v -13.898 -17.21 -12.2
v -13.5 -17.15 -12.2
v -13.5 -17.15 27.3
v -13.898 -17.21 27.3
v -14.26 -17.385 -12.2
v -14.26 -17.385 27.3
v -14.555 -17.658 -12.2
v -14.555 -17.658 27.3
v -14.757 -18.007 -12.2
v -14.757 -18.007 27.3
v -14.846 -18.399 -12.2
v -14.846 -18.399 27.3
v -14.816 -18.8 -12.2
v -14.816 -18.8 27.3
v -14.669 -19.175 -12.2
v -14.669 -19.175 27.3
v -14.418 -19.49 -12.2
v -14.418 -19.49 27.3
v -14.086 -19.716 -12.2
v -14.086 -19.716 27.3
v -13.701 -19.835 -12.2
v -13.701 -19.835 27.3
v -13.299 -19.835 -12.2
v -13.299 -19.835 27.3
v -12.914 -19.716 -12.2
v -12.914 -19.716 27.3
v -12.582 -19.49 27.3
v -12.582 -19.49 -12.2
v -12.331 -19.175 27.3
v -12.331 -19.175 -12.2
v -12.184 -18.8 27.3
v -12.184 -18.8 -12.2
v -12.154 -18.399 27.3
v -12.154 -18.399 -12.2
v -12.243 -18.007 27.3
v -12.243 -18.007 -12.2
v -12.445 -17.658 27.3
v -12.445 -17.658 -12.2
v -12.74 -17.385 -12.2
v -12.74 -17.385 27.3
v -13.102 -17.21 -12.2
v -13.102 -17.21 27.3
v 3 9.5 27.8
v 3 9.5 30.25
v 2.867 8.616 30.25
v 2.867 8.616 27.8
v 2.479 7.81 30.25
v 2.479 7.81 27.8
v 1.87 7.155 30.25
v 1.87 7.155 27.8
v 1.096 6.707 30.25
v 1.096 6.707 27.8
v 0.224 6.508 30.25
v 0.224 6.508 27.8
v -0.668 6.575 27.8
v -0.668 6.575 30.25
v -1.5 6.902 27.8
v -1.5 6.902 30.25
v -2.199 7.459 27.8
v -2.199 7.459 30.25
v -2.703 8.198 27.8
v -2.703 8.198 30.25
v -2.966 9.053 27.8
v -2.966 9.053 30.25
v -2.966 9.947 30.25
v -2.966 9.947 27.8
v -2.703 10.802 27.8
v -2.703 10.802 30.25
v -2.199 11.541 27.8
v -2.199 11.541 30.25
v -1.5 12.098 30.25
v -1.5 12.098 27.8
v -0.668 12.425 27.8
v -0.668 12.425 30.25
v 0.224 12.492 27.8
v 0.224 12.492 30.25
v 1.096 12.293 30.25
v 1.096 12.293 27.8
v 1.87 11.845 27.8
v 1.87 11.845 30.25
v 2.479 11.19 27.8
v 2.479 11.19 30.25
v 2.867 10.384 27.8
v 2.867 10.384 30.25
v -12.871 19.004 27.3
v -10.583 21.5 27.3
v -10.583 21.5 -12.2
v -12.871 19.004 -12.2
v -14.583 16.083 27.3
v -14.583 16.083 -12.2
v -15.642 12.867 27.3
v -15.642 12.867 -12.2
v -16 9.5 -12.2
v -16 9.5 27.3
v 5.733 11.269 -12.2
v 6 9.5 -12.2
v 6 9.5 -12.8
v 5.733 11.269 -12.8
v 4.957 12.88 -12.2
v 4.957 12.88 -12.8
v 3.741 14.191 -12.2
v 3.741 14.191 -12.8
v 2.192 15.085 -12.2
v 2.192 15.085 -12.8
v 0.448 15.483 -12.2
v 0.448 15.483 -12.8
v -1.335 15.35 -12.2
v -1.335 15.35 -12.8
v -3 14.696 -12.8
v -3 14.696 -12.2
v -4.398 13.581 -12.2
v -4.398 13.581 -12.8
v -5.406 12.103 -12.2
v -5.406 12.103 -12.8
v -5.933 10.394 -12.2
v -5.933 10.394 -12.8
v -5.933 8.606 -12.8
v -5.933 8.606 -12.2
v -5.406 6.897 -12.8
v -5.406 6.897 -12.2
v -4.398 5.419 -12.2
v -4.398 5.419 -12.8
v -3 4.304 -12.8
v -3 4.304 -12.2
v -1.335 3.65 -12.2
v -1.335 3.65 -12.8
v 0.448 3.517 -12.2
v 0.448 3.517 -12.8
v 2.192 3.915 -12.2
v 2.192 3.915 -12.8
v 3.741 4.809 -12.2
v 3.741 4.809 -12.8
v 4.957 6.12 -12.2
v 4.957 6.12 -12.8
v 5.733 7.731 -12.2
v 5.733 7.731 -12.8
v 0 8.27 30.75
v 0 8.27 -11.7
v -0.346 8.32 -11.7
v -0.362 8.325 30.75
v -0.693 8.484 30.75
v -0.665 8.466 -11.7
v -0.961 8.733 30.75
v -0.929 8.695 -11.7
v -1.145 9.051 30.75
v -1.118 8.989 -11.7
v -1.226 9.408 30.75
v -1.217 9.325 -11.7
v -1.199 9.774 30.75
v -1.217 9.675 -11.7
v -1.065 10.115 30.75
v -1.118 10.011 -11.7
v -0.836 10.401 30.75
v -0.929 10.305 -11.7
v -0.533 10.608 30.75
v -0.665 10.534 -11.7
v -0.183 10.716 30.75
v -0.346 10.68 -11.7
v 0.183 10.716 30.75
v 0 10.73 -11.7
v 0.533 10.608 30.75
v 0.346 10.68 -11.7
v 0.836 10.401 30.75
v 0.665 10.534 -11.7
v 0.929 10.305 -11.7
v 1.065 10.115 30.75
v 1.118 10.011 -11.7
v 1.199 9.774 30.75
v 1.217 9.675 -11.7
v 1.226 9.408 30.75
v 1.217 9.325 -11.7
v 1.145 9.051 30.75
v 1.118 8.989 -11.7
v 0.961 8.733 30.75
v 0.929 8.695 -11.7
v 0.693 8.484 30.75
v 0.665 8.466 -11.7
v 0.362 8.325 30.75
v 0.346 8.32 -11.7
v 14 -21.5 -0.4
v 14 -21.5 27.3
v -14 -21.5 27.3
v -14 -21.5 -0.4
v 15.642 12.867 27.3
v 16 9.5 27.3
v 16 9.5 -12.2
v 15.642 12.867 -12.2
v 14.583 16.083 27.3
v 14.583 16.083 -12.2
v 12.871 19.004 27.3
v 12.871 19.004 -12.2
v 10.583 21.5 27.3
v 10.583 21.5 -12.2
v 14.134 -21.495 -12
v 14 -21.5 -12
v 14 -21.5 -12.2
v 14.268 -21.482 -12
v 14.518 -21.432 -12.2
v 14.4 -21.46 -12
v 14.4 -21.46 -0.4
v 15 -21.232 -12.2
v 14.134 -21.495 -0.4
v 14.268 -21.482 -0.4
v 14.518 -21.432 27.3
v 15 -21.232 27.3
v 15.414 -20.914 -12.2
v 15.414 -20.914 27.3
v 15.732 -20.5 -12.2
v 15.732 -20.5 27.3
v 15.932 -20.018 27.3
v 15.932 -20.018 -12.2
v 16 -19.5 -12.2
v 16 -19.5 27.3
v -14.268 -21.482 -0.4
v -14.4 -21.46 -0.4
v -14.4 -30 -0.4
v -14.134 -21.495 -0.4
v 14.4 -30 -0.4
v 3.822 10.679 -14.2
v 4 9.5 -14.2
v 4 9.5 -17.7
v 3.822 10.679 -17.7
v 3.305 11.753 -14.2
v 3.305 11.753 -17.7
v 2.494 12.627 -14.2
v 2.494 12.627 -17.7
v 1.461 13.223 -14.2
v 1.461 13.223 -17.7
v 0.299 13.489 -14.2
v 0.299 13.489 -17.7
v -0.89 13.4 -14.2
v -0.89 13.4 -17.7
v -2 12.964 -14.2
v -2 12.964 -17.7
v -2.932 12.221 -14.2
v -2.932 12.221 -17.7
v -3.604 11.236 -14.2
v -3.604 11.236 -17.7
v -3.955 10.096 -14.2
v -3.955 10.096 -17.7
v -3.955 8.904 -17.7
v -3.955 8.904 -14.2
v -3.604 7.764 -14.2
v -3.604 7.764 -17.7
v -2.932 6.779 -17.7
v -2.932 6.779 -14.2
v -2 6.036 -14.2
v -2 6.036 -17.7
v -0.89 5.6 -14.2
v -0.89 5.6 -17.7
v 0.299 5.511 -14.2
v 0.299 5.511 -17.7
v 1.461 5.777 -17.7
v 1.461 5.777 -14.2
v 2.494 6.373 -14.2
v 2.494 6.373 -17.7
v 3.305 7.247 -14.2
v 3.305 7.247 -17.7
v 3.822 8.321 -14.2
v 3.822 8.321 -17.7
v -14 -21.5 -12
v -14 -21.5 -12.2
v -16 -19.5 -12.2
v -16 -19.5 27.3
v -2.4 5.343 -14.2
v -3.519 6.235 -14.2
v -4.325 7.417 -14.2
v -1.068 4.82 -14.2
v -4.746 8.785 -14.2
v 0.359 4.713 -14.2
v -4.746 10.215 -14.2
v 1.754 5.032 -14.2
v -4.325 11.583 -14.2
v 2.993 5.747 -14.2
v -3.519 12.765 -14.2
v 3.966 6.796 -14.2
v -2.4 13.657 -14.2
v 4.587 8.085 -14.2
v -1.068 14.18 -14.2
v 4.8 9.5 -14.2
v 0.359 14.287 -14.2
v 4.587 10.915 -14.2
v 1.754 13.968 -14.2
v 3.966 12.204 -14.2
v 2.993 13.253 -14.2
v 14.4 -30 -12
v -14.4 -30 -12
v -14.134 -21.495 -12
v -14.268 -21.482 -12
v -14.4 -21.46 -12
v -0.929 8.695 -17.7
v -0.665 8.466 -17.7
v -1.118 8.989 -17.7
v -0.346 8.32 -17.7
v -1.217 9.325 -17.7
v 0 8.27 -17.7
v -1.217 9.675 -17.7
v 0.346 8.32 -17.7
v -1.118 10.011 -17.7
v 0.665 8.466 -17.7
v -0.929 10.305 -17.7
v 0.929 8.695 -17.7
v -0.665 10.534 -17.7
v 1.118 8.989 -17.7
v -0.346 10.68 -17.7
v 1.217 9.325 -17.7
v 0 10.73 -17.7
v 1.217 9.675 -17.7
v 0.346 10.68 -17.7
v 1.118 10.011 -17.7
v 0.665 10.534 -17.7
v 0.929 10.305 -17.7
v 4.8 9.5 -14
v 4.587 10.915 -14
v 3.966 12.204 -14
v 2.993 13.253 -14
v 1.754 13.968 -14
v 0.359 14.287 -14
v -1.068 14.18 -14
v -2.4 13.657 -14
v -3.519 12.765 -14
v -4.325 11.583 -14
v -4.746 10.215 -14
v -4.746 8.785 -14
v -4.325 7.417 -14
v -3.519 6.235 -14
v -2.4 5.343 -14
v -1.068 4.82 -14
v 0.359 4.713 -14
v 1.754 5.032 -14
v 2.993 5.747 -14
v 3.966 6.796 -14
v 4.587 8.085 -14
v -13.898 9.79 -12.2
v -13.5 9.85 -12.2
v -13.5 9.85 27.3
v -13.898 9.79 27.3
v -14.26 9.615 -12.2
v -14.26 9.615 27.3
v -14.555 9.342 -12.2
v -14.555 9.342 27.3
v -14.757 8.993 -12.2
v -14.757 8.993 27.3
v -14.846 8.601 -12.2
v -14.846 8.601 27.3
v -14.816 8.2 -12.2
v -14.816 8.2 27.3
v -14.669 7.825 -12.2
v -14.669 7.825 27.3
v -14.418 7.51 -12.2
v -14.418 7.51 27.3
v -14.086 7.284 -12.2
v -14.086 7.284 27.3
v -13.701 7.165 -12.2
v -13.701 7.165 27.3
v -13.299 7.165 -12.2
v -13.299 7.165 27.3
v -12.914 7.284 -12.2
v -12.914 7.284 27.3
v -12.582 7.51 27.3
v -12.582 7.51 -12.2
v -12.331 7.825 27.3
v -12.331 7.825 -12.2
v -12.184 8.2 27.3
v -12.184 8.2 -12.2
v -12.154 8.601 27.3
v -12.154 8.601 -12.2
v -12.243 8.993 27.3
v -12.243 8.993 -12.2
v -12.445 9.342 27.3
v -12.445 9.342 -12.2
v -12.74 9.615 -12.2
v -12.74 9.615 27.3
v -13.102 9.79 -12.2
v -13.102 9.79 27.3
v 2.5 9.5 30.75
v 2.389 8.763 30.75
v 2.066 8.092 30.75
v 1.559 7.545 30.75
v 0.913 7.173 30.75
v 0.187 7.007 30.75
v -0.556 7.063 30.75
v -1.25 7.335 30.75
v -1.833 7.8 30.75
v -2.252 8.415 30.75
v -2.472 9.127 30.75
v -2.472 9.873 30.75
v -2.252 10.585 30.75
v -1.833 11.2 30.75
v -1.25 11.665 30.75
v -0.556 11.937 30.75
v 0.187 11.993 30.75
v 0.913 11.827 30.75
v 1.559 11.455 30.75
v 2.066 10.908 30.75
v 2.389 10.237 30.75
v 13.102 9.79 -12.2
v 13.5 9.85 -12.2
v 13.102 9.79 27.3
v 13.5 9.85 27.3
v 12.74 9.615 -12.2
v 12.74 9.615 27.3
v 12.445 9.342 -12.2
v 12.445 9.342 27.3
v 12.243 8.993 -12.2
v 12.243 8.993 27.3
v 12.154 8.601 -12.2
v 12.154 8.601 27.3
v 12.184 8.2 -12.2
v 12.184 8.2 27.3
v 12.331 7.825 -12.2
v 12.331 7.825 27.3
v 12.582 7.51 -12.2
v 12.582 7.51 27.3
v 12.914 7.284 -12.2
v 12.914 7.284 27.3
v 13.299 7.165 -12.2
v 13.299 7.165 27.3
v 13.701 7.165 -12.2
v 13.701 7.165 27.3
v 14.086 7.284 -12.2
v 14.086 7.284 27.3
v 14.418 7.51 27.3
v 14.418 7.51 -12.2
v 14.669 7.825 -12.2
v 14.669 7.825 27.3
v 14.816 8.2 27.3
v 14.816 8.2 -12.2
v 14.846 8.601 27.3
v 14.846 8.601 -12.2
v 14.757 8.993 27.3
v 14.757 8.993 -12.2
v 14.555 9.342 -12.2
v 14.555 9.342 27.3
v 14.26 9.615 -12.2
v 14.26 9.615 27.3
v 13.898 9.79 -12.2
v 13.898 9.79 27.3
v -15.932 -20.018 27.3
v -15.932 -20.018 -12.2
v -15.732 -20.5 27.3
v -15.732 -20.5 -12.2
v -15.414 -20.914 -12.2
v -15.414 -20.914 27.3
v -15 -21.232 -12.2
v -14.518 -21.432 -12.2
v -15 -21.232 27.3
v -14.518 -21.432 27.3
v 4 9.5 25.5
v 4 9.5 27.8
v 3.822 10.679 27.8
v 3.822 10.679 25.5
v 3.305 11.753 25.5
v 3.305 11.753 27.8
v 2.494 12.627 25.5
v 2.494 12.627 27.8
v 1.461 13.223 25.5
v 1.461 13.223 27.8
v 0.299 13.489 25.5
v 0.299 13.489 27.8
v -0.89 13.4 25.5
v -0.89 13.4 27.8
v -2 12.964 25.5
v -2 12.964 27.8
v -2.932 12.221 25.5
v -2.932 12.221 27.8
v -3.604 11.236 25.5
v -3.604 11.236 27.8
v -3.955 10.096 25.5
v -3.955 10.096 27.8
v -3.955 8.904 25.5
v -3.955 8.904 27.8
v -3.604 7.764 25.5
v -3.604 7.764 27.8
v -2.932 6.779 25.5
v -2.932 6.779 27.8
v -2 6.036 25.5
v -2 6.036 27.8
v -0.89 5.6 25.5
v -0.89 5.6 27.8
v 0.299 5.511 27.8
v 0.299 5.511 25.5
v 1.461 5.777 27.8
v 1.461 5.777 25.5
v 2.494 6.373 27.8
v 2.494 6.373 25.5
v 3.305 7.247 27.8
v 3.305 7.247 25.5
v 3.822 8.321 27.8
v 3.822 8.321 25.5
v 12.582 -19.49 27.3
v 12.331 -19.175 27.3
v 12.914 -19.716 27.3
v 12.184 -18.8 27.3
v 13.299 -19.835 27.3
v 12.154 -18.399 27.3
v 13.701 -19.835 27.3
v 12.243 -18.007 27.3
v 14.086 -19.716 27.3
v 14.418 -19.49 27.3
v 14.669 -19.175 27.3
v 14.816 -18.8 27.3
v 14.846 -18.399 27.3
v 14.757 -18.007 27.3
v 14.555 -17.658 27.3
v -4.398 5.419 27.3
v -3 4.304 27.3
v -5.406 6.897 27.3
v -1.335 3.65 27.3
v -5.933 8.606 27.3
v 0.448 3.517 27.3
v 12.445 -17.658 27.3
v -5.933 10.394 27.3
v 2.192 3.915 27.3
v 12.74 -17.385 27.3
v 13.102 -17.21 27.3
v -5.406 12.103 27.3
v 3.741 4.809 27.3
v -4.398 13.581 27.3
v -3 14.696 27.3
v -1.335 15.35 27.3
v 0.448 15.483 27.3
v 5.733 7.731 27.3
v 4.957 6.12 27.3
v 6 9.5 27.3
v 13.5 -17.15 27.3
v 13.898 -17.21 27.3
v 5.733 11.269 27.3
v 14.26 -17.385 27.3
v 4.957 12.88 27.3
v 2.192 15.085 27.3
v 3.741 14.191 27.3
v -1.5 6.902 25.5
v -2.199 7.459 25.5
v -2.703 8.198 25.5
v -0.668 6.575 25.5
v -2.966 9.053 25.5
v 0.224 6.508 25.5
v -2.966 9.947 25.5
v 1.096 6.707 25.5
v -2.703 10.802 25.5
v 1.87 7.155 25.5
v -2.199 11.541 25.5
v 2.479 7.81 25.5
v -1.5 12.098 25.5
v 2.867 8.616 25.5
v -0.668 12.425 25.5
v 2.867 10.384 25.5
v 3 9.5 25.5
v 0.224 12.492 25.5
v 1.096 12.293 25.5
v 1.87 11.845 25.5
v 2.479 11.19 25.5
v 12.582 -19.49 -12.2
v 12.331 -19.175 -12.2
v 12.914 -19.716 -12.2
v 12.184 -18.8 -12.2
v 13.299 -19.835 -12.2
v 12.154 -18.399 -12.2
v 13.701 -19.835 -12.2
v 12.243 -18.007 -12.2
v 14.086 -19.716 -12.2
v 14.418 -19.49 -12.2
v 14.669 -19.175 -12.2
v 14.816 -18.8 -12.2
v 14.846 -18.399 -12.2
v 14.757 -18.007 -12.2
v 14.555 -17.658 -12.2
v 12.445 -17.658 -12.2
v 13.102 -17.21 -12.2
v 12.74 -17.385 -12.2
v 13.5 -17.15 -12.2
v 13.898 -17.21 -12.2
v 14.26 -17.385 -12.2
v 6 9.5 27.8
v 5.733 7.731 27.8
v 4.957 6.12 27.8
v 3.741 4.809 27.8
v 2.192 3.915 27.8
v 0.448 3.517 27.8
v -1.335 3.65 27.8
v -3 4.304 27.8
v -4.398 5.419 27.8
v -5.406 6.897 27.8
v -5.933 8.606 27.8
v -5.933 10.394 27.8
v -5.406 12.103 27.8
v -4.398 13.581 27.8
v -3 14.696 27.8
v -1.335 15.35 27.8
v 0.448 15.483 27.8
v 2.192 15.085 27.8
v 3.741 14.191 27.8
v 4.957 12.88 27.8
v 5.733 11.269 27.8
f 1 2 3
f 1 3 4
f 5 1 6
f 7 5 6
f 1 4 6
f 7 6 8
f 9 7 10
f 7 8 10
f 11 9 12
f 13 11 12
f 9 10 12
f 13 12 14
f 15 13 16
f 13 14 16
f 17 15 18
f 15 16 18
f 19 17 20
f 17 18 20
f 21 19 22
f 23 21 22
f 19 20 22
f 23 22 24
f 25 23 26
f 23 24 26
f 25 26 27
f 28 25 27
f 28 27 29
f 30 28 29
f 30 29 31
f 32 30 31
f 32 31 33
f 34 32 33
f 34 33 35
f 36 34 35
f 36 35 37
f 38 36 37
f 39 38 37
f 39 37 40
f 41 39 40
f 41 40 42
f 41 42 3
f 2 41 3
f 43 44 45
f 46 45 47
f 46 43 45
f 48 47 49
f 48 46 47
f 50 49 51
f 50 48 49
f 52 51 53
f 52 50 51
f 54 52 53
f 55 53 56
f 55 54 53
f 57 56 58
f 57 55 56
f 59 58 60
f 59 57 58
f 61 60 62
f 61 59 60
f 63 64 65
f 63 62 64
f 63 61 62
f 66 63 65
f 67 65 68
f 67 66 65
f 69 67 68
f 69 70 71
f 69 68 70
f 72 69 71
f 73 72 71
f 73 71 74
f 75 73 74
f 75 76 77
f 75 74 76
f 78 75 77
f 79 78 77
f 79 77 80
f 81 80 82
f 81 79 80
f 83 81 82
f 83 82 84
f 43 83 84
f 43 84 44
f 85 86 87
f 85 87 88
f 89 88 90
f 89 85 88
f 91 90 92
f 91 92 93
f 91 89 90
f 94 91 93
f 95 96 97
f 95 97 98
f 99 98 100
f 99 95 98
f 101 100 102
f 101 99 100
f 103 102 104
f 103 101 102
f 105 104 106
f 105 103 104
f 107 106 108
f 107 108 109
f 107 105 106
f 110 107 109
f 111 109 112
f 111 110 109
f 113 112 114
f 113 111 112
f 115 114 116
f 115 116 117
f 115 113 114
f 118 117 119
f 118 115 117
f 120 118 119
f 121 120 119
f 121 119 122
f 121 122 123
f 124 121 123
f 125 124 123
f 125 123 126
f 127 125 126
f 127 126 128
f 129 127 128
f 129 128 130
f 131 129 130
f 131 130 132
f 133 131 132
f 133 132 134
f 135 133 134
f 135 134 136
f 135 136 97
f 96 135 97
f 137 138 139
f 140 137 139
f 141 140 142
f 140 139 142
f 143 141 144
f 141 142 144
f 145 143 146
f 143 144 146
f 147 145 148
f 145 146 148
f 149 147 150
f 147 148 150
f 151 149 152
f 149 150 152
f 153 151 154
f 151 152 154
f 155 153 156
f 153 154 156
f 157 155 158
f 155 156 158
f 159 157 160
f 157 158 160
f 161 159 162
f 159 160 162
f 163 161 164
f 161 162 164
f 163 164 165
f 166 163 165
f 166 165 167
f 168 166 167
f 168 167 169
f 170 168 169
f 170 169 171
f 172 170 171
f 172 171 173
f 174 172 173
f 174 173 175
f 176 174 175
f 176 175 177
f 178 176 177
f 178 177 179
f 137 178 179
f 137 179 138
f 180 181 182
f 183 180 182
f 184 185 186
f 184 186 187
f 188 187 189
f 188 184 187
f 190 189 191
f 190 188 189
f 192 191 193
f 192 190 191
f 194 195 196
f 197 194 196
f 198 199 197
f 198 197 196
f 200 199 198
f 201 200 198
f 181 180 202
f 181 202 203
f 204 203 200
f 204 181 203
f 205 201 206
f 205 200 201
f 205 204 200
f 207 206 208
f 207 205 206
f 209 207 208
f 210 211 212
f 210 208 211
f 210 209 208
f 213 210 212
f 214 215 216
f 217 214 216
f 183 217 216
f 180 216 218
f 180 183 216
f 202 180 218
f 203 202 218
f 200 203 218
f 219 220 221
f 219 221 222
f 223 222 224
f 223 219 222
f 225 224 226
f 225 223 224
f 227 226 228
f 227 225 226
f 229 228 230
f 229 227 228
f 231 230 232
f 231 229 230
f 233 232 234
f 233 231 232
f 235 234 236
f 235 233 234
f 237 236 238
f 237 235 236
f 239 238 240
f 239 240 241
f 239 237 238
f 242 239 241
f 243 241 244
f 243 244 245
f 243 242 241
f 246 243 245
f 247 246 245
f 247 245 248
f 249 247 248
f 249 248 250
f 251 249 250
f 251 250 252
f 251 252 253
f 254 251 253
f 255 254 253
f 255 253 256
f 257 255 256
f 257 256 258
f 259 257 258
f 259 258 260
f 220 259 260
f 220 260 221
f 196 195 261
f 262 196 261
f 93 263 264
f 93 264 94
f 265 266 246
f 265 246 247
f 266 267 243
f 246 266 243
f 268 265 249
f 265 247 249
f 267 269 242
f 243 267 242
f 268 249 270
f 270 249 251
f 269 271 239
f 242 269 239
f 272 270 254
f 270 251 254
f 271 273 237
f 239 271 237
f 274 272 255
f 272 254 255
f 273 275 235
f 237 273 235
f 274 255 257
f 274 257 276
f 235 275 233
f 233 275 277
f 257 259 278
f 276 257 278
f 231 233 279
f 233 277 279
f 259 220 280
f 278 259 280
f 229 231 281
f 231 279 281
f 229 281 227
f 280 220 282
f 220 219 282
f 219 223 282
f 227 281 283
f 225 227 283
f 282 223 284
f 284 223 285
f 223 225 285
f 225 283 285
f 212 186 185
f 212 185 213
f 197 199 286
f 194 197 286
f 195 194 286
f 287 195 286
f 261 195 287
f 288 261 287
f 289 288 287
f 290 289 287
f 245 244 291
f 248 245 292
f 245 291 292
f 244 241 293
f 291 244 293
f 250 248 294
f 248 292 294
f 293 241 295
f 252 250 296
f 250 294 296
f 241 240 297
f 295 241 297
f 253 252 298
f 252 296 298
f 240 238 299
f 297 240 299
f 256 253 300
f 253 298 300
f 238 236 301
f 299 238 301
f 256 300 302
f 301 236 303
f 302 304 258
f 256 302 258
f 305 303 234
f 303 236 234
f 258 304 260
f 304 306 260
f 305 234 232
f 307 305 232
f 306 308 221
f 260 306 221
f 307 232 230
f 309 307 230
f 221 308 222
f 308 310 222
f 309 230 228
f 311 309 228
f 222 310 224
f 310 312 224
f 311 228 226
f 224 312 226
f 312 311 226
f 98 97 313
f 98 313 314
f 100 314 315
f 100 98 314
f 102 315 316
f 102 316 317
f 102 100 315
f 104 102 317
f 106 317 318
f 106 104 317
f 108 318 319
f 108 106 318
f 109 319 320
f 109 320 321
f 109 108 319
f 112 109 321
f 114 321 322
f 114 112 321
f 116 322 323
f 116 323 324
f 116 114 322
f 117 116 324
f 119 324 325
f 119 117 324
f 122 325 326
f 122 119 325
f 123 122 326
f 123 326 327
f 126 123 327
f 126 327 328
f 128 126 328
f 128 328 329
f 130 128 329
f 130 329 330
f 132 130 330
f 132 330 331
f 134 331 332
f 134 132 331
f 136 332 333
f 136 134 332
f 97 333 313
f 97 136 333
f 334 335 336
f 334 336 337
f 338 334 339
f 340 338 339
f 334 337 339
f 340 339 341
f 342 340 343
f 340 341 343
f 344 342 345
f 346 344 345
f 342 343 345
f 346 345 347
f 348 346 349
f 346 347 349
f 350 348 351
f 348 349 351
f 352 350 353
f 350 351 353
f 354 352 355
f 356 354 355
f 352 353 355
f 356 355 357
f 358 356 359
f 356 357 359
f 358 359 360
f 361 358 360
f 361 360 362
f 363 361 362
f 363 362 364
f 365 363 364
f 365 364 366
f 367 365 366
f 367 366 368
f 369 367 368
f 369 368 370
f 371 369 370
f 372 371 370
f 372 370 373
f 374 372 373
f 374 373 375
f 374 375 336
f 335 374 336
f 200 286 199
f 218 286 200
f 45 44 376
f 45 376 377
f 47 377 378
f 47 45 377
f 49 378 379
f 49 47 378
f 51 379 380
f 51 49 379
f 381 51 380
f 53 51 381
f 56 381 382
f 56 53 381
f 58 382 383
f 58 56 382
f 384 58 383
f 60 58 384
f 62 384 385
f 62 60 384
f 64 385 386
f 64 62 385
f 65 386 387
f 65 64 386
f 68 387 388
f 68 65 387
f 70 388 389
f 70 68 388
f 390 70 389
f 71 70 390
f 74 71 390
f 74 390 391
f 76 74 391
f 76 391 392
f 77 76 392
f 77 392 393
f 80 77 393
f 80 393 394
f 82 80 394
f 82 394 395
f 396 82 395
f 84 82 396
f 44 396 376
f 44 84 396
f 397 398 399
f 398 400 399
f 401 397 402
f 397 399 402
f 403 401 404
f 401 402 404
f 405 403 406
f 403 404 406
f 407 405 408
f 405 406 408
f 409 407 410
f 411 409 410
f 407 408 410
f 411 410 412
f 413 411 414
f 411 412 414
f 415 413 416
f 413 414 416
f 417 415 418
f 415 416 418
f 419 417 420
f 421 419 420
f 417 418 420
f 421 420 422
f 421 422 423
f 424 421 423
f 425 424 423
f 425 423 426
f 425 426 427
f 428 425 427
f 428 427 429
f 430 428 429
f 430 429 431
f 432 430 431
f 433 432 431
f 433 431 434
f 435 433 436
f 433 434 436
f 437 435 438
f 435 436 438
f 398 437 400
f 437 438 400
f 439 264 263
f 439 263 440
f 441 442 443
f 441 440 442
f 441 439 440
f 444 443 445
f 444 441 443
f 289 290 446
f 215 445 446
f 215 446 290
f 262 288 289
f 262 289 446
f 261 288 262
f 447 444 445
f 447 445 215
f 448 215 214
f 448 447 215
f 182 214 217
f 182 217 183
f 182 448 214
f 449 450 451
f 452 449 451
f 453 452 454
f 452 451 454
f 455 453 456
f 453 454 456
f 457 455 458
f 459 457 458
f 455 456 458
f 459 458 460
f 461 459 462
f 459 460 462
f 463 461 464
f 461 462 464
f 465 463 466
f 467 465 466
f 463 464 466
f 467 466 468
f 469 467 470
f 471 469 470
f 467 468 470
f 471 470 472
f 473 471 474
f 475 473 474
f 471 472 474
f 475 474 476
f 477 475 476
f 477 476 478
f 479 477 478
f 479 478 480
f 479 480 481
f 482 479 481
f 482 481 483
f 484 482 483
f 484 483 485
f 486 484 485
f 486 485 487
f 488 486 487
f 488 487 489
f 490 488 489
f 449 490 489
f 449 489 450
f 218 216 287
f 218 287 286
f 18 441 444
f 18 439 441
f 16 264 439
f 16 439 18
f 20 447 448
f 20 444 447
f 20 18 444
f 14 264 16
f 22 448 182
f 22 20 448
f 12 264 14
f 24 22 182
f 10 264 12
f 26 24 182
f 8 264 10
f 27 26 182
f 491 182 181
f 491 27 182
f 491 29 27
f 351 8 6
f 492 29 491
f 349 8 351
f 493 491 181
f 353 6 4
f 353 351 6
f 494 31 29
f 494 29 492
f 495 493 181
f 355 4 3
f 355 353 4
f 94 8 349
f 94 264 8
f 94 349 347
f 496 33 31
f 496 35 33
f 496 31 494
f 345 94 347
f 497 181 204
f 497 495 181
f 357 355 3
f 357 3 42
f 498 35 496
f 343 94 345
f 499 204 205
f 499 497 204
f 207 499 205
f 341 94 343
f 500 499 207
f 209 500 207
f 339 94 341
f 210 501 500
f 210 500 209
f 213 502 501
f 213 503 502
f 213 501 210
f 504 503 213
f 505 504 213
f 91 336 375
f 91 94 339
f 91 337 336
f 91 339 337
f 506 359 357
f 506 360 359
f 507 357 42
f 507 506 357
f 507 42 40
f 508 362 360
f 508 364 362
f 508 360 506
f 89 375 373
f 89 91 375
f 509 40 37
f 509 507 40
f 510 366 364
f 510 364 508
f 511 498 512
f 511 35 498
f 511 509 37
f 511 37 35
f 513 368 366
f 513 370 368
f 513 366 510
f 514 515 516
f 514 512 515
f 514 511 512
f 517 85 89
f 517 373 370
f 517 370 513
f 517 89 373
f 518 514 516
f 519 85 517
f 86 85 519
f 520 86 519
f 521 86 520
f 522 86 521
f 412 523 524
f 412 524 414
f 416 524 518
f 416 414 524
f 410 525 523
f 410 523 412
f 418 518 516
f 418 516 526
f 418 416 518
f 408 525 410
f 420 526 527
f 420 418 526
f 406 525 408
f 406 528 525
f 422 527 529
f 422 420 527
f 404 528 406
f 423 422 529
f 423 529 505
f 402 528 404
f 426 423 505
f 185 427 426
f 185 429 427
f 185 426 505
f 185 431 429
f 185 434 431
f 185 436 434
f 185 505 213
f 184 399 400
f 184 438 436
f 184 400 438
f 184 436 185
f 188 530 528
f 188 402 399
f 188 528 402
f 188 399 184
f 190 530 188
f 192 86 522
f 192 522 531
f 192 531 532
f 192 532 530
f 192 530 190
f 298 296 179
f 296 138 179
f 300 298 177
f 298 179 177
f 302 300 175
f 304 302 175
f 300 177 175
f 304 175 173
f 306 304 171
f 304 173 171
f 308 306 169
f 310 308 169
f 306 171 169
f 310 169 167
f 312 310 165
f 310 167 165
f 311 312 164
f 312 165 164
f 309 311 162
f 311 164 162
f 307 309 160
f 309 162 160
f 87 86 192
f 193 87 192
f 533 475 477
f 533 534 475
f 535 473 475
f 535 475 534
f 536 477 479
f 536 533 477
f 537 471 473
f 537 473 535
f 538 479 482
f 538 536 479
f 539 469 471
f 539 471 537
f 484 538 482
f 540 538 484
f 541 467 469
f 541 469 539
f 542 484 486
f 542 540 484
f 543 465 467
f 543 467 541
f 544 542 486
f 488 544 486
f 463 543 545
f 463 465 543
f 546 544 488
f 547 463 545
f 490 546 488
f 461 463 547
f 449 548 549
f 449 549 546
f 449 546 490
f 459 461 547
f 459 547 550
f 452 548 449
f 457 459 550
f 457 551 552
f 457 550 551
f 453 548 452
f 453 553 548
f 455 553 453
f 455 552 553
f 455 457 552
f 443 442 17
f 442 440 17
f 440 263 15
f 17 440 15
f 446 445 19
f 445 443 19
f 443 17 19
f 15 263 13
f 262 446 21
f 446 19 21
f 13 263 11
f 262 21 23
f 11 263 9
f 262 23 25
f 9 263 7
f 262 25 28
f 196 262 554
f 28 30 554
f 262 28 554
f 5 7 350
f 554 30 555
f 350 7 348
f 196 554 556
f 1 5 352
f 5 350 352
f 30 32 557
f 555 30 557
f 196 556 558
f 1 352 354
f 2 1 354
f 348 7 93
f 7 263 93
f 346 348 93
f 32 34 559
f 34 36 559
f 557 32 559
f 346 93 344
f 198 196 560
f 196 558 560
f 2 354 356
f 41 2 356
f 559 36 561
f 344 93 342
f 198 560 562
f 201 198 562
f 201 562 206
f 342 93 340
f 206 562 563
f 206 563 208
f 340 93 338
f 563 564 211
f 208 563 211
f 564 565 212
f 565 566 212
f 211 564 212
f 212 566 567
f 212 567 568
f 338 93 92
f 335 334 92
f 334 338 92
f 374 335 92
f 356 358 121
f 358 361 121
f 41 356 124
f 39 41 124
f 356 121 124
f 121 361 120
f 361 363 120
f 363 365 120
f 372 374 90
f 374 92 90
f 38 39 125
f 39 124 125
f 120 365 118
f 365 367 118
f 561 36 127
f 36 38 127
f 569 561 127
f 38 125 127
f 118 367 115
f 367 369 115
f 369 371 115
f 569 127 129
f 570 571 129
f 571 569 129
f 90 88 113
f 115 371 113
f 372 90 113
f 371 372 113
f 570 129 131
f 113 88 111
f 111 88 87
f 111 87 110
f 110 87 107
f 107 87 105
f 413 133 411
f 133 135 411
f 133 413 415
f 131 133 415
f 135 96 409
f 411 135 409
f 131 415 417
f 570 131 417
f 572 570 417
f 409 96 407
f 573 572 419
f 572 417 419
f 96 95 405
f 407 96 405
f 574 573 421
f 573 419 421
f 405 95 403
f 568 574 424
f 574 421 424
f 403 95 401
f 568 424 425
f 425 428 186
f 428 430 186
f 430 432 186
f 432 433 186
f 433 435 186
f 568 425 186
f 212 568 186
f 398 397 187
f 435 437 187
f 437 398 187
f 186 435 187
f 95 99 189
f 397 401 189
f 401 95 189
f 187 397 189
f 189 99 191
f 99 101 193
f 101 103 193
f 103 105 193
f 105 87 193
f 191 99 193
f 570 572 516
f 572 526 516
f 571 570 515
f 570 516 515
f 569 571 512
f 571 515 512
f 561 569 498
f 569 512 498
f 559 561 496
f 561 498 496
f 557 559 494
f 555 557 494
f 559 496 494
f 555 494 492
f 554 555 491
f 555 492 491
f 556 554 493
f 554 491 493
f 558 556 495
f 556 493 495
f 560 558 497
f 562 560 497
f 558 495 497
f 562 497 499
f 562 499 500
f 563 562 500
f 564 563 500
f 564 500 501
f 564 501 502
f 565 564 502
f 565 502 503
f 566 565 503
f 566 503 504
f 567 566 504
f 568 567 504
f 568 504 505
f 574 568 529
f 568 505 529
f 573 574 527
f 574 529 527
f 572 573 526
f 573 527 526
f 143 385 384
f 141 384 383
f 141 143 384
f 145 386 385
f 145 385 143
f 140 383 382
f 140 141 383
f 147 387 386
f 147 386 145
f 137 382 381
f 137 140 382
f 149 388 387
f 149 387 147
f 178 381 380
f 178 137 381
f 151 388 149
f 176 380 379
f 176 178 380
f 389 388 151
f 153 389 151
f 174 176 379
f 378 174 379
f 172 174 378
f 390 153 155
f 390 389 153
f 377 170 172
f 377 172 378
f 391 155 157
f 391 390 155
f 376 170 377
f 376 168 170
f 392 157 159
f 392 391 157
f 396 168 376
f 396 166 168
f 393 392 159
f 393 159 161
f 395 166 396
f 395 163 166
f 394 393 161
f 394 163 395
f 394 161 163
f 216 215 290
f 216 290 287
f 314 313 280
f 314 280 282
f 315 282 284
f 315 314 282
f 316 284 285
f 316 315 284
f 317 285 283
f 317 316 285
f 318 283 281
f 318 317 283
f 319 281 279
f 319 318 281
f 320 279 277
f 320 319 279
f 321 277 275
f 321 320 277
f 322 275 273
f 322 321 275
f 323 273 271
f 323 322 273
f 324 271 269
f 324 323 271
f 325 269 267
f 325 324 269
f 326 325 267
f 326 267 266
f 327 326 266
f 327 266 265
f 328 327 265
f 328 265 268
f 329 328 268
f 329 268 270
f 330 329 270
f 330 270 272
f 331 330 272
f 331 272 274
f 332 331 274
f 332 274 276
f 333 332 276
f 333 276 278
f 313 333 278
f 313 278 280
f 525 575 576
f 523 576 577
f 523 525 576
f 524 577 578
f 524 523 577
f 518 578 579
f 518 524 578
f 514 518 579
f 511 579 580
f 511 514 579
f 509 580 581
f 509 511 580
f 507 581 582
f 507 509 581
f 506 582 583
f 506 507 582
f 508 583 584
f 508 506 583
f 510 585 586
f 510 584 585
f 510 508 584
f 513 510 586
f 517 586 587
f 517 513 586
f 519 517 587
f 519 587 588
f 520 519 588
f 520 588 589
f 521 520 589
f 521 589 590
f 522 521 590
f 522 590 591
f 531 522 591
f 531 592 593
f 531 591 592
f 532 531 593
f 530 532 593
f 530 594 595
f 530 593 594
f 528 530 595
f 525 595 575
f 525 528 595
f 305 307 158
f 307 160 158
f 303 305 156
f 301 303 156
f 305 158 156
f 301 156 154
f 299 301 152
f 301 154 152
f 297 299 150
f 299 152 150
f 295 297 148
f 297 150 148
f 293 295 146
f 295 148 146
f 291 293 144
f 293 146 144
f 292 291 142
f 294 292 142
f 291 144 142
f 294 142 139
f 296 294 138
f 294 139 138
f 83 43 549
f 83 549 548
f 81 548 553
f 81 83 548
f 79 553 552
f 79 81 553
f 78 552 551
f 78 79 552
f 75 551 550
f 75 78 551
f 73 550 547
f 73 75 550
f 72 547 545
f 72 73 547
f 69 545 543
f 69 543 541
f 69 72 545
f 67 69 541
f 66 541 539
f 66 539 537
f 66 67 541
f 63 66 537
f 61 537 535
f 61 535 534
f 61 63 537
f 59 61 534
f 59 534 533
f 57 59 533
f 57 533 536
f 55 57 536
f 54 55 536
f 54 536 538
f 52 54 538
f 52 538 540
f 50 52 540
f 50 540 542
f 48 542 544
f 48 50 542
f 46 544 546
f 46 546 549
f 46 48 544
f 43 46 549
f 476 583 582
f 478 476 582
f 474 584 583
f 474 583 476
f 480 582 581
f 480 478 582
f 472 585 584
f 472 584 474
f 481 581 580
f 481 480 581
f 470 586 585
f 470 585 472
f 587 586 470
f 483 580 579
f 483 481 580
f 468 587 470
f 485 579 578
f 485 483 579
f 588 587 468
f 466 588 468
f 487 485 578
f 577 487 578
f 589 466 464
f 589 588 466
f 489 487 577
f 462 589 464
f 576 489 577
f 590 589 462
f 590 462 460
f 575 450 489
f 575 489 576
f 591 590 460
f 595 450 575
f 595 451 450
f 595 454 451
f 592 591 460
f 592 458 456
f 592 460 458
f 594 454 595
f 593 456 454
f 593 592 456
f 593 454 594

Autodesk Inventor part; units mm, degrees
ref_plane "YZ Plane" through (0, 0, 0) normal (1, 0, 0) x (0, 1, 0)
ref_plane "XZ Plane" through (0, 0, 0) normal (0, 1, 0) x (-1, 0, 0)
ref_plane "XY Plane" through (0, 0, 0) normal (0, 0, 1) x (1, 0, 0)
sketch "スケッチ1" plane through (0, 0, 0) normal (0, 0, 1) x (1, 0, 0)
  line L0 (-16, 21.5) -> (-10.583, 21.5) construction
  line L1 (16, 21.5) -> (16, 9.5) construction
  line L2 (16, -21.5) -> (-16, -21.5)
  line L3 (-16, -21.5) -> (-16, 9.5)
  line L4 (-16, 21.5) -> (16, -21.5) construction
  line L5 (16, 21.5) -> (-16, -21.5) construction
  line L6 (-14.4, -21.5) -> (-14.4, -30)
  line L7 (-14.4, -30) -> (14.4, -30)
  line L8 (0, 21.5) -> (0, -21.5) construction
  line L9 (14.4, -21.5) -> (14.4, -30)
  line L10 (-13.5, 21.5) -> (-13.5, -21.5) construction
  circle A0 centre (0, 9.5) radius 6
  circle A1 centre (0, 9.5) radius 4
  arc A2 (-10.583, 21.5) -> (-16, 9.5) centre (0, 9.5) ccw
  arc A3 (16, 9.5) -> (10.583, 21.5) centre (0, 9.5) ccw
  line L11 (-10.583, 21.5) -> (10.583, 21.5)
  line L12 (-16, 9.5) -> (-16, 21.5) construction
  line L13 (10.583, 21.5) -> (16, 21.5) construction
  line L14 (16, 9.5) -> (16, -21.5)
  circle A4 centre (0, 9.5) radius 3
  circle A5 centre (0, 9.5) radius 4.8
  point P0 (0, 0)
  point P1 (-13.5, 8.5)
  point P2 (-13.5, -18.5)
  point P3 (13.5, 8.5)
  point P4 (13.5, -18.5)
  dimension "d0" = 32
  dimension "d1" = 43
  dimension "d4" = 28.8
  dimension "d5" = 8.5
  dimension "d8" = 27
  dimension "d9" = 8.5
  dimension "d12" = 18.5
  dimension "d13" = 12
  dimension "d14" = 8
  dimension "d15" = 9.5
  dimension "d17" = 16
  dimension "d32" = 13.5
  dimension "d47" = 6
  dimension "d67" = 9.6
extrude "押し出し1" add sketch "スケッチ1" against normal blind 12.2 contours L2 L3 A2 L11 A3 L14 | A0 | A1 | A4 | A5
extrude "押し出し2" add sketch "スケッチ1" against normal blind 12 contours L9 L7 L6 L2
extrude "押し出し3" add sketch "スケッチ1" against normal blind 14 contours A0 | A1 | A4 | A5
extrude "押し出し4" add sketch "スケッチ1" against normal blind 17.7 contours A1 | A4
chamfer "面取り1" distance 1.2 angle 45 1 edges at (-6, 9.5, -14)
sketch "スケッチ2" plane through (0, 9.5, -17.7) normal (0, 0, -1) x (-1, 0, 0)
  circle A0 centre (0, 0) radius 4 projected
  point P0 (0, -9.5)
hole "穴1" at (0, 9.5, -17.7) direction (0, 0, 1) diameter 2.459 depth 6 thread size "M3x0.5" class "6H" standard "ANSI Metric M Profile"
extrude "押し出し5" add sketch "スケッチ1" along normal blind 27.3 contours L2 L3 A2 L11 A3 L14 | A0 | A1 | A4 | A5
hole "穴2" at (-13.5, 8.5, 0) at (-13.5, -18.5, 0) at (13.5, 8.5, 0) at (13.5, -18.5, 0) direction (0, 0, 1) diameter 2.7 end through all both
extrude "押し出し6" cut sketch "スケッチ1" against normal blind 0.4 contours L9 L7 L6 L2
fillet "フィレット1" radius 2 2 edges at (16, -21.5, 7.55) (-16, -21.5, 7.55)
extrude "押し出し7" add sketch "スケッチ1" along normal blind 27.8 contours A0 | A1 | A4 | A5
extrude "押し出し8" add sketch "スケッチ1" along normal blind 30.75 contours A4
sketch "スケッチ3" plane through (0, 9.5, 30.75) normal (0, 0, 1) x (1, 0, 0)
  circle A0 centre (0, 0) radius 1.2295 projected
  point P0 (0, -9.5)
hole "穴3" at (0, 9.5, 30.75) direction (0, 0, -1) diameter 2.459 end through all thread size "M3x0.5" class "6H" standard "ANSI Metric M Profile"
sketch "スケッチ4" plane through (0, 9.5, 27.8) normal (0, 0, 1) x (1, 0, 0)
  circle A0 centre (0, 0) radius 4
  circle A1 centre (0, 0) radius 3
  point P0 (0, -9.5)
extrude "押し出し9" cut sketch "スケッチ4" against normal blind 2.3
chamfer "面取り2" distance 0.5 angle 45 1 edges at (-3, 9.5, 30.75)
extrude "押し出し10" add sketch "スケッチ1" against normal blind 14.2 contours A5
properties part number "B3M11xx"
